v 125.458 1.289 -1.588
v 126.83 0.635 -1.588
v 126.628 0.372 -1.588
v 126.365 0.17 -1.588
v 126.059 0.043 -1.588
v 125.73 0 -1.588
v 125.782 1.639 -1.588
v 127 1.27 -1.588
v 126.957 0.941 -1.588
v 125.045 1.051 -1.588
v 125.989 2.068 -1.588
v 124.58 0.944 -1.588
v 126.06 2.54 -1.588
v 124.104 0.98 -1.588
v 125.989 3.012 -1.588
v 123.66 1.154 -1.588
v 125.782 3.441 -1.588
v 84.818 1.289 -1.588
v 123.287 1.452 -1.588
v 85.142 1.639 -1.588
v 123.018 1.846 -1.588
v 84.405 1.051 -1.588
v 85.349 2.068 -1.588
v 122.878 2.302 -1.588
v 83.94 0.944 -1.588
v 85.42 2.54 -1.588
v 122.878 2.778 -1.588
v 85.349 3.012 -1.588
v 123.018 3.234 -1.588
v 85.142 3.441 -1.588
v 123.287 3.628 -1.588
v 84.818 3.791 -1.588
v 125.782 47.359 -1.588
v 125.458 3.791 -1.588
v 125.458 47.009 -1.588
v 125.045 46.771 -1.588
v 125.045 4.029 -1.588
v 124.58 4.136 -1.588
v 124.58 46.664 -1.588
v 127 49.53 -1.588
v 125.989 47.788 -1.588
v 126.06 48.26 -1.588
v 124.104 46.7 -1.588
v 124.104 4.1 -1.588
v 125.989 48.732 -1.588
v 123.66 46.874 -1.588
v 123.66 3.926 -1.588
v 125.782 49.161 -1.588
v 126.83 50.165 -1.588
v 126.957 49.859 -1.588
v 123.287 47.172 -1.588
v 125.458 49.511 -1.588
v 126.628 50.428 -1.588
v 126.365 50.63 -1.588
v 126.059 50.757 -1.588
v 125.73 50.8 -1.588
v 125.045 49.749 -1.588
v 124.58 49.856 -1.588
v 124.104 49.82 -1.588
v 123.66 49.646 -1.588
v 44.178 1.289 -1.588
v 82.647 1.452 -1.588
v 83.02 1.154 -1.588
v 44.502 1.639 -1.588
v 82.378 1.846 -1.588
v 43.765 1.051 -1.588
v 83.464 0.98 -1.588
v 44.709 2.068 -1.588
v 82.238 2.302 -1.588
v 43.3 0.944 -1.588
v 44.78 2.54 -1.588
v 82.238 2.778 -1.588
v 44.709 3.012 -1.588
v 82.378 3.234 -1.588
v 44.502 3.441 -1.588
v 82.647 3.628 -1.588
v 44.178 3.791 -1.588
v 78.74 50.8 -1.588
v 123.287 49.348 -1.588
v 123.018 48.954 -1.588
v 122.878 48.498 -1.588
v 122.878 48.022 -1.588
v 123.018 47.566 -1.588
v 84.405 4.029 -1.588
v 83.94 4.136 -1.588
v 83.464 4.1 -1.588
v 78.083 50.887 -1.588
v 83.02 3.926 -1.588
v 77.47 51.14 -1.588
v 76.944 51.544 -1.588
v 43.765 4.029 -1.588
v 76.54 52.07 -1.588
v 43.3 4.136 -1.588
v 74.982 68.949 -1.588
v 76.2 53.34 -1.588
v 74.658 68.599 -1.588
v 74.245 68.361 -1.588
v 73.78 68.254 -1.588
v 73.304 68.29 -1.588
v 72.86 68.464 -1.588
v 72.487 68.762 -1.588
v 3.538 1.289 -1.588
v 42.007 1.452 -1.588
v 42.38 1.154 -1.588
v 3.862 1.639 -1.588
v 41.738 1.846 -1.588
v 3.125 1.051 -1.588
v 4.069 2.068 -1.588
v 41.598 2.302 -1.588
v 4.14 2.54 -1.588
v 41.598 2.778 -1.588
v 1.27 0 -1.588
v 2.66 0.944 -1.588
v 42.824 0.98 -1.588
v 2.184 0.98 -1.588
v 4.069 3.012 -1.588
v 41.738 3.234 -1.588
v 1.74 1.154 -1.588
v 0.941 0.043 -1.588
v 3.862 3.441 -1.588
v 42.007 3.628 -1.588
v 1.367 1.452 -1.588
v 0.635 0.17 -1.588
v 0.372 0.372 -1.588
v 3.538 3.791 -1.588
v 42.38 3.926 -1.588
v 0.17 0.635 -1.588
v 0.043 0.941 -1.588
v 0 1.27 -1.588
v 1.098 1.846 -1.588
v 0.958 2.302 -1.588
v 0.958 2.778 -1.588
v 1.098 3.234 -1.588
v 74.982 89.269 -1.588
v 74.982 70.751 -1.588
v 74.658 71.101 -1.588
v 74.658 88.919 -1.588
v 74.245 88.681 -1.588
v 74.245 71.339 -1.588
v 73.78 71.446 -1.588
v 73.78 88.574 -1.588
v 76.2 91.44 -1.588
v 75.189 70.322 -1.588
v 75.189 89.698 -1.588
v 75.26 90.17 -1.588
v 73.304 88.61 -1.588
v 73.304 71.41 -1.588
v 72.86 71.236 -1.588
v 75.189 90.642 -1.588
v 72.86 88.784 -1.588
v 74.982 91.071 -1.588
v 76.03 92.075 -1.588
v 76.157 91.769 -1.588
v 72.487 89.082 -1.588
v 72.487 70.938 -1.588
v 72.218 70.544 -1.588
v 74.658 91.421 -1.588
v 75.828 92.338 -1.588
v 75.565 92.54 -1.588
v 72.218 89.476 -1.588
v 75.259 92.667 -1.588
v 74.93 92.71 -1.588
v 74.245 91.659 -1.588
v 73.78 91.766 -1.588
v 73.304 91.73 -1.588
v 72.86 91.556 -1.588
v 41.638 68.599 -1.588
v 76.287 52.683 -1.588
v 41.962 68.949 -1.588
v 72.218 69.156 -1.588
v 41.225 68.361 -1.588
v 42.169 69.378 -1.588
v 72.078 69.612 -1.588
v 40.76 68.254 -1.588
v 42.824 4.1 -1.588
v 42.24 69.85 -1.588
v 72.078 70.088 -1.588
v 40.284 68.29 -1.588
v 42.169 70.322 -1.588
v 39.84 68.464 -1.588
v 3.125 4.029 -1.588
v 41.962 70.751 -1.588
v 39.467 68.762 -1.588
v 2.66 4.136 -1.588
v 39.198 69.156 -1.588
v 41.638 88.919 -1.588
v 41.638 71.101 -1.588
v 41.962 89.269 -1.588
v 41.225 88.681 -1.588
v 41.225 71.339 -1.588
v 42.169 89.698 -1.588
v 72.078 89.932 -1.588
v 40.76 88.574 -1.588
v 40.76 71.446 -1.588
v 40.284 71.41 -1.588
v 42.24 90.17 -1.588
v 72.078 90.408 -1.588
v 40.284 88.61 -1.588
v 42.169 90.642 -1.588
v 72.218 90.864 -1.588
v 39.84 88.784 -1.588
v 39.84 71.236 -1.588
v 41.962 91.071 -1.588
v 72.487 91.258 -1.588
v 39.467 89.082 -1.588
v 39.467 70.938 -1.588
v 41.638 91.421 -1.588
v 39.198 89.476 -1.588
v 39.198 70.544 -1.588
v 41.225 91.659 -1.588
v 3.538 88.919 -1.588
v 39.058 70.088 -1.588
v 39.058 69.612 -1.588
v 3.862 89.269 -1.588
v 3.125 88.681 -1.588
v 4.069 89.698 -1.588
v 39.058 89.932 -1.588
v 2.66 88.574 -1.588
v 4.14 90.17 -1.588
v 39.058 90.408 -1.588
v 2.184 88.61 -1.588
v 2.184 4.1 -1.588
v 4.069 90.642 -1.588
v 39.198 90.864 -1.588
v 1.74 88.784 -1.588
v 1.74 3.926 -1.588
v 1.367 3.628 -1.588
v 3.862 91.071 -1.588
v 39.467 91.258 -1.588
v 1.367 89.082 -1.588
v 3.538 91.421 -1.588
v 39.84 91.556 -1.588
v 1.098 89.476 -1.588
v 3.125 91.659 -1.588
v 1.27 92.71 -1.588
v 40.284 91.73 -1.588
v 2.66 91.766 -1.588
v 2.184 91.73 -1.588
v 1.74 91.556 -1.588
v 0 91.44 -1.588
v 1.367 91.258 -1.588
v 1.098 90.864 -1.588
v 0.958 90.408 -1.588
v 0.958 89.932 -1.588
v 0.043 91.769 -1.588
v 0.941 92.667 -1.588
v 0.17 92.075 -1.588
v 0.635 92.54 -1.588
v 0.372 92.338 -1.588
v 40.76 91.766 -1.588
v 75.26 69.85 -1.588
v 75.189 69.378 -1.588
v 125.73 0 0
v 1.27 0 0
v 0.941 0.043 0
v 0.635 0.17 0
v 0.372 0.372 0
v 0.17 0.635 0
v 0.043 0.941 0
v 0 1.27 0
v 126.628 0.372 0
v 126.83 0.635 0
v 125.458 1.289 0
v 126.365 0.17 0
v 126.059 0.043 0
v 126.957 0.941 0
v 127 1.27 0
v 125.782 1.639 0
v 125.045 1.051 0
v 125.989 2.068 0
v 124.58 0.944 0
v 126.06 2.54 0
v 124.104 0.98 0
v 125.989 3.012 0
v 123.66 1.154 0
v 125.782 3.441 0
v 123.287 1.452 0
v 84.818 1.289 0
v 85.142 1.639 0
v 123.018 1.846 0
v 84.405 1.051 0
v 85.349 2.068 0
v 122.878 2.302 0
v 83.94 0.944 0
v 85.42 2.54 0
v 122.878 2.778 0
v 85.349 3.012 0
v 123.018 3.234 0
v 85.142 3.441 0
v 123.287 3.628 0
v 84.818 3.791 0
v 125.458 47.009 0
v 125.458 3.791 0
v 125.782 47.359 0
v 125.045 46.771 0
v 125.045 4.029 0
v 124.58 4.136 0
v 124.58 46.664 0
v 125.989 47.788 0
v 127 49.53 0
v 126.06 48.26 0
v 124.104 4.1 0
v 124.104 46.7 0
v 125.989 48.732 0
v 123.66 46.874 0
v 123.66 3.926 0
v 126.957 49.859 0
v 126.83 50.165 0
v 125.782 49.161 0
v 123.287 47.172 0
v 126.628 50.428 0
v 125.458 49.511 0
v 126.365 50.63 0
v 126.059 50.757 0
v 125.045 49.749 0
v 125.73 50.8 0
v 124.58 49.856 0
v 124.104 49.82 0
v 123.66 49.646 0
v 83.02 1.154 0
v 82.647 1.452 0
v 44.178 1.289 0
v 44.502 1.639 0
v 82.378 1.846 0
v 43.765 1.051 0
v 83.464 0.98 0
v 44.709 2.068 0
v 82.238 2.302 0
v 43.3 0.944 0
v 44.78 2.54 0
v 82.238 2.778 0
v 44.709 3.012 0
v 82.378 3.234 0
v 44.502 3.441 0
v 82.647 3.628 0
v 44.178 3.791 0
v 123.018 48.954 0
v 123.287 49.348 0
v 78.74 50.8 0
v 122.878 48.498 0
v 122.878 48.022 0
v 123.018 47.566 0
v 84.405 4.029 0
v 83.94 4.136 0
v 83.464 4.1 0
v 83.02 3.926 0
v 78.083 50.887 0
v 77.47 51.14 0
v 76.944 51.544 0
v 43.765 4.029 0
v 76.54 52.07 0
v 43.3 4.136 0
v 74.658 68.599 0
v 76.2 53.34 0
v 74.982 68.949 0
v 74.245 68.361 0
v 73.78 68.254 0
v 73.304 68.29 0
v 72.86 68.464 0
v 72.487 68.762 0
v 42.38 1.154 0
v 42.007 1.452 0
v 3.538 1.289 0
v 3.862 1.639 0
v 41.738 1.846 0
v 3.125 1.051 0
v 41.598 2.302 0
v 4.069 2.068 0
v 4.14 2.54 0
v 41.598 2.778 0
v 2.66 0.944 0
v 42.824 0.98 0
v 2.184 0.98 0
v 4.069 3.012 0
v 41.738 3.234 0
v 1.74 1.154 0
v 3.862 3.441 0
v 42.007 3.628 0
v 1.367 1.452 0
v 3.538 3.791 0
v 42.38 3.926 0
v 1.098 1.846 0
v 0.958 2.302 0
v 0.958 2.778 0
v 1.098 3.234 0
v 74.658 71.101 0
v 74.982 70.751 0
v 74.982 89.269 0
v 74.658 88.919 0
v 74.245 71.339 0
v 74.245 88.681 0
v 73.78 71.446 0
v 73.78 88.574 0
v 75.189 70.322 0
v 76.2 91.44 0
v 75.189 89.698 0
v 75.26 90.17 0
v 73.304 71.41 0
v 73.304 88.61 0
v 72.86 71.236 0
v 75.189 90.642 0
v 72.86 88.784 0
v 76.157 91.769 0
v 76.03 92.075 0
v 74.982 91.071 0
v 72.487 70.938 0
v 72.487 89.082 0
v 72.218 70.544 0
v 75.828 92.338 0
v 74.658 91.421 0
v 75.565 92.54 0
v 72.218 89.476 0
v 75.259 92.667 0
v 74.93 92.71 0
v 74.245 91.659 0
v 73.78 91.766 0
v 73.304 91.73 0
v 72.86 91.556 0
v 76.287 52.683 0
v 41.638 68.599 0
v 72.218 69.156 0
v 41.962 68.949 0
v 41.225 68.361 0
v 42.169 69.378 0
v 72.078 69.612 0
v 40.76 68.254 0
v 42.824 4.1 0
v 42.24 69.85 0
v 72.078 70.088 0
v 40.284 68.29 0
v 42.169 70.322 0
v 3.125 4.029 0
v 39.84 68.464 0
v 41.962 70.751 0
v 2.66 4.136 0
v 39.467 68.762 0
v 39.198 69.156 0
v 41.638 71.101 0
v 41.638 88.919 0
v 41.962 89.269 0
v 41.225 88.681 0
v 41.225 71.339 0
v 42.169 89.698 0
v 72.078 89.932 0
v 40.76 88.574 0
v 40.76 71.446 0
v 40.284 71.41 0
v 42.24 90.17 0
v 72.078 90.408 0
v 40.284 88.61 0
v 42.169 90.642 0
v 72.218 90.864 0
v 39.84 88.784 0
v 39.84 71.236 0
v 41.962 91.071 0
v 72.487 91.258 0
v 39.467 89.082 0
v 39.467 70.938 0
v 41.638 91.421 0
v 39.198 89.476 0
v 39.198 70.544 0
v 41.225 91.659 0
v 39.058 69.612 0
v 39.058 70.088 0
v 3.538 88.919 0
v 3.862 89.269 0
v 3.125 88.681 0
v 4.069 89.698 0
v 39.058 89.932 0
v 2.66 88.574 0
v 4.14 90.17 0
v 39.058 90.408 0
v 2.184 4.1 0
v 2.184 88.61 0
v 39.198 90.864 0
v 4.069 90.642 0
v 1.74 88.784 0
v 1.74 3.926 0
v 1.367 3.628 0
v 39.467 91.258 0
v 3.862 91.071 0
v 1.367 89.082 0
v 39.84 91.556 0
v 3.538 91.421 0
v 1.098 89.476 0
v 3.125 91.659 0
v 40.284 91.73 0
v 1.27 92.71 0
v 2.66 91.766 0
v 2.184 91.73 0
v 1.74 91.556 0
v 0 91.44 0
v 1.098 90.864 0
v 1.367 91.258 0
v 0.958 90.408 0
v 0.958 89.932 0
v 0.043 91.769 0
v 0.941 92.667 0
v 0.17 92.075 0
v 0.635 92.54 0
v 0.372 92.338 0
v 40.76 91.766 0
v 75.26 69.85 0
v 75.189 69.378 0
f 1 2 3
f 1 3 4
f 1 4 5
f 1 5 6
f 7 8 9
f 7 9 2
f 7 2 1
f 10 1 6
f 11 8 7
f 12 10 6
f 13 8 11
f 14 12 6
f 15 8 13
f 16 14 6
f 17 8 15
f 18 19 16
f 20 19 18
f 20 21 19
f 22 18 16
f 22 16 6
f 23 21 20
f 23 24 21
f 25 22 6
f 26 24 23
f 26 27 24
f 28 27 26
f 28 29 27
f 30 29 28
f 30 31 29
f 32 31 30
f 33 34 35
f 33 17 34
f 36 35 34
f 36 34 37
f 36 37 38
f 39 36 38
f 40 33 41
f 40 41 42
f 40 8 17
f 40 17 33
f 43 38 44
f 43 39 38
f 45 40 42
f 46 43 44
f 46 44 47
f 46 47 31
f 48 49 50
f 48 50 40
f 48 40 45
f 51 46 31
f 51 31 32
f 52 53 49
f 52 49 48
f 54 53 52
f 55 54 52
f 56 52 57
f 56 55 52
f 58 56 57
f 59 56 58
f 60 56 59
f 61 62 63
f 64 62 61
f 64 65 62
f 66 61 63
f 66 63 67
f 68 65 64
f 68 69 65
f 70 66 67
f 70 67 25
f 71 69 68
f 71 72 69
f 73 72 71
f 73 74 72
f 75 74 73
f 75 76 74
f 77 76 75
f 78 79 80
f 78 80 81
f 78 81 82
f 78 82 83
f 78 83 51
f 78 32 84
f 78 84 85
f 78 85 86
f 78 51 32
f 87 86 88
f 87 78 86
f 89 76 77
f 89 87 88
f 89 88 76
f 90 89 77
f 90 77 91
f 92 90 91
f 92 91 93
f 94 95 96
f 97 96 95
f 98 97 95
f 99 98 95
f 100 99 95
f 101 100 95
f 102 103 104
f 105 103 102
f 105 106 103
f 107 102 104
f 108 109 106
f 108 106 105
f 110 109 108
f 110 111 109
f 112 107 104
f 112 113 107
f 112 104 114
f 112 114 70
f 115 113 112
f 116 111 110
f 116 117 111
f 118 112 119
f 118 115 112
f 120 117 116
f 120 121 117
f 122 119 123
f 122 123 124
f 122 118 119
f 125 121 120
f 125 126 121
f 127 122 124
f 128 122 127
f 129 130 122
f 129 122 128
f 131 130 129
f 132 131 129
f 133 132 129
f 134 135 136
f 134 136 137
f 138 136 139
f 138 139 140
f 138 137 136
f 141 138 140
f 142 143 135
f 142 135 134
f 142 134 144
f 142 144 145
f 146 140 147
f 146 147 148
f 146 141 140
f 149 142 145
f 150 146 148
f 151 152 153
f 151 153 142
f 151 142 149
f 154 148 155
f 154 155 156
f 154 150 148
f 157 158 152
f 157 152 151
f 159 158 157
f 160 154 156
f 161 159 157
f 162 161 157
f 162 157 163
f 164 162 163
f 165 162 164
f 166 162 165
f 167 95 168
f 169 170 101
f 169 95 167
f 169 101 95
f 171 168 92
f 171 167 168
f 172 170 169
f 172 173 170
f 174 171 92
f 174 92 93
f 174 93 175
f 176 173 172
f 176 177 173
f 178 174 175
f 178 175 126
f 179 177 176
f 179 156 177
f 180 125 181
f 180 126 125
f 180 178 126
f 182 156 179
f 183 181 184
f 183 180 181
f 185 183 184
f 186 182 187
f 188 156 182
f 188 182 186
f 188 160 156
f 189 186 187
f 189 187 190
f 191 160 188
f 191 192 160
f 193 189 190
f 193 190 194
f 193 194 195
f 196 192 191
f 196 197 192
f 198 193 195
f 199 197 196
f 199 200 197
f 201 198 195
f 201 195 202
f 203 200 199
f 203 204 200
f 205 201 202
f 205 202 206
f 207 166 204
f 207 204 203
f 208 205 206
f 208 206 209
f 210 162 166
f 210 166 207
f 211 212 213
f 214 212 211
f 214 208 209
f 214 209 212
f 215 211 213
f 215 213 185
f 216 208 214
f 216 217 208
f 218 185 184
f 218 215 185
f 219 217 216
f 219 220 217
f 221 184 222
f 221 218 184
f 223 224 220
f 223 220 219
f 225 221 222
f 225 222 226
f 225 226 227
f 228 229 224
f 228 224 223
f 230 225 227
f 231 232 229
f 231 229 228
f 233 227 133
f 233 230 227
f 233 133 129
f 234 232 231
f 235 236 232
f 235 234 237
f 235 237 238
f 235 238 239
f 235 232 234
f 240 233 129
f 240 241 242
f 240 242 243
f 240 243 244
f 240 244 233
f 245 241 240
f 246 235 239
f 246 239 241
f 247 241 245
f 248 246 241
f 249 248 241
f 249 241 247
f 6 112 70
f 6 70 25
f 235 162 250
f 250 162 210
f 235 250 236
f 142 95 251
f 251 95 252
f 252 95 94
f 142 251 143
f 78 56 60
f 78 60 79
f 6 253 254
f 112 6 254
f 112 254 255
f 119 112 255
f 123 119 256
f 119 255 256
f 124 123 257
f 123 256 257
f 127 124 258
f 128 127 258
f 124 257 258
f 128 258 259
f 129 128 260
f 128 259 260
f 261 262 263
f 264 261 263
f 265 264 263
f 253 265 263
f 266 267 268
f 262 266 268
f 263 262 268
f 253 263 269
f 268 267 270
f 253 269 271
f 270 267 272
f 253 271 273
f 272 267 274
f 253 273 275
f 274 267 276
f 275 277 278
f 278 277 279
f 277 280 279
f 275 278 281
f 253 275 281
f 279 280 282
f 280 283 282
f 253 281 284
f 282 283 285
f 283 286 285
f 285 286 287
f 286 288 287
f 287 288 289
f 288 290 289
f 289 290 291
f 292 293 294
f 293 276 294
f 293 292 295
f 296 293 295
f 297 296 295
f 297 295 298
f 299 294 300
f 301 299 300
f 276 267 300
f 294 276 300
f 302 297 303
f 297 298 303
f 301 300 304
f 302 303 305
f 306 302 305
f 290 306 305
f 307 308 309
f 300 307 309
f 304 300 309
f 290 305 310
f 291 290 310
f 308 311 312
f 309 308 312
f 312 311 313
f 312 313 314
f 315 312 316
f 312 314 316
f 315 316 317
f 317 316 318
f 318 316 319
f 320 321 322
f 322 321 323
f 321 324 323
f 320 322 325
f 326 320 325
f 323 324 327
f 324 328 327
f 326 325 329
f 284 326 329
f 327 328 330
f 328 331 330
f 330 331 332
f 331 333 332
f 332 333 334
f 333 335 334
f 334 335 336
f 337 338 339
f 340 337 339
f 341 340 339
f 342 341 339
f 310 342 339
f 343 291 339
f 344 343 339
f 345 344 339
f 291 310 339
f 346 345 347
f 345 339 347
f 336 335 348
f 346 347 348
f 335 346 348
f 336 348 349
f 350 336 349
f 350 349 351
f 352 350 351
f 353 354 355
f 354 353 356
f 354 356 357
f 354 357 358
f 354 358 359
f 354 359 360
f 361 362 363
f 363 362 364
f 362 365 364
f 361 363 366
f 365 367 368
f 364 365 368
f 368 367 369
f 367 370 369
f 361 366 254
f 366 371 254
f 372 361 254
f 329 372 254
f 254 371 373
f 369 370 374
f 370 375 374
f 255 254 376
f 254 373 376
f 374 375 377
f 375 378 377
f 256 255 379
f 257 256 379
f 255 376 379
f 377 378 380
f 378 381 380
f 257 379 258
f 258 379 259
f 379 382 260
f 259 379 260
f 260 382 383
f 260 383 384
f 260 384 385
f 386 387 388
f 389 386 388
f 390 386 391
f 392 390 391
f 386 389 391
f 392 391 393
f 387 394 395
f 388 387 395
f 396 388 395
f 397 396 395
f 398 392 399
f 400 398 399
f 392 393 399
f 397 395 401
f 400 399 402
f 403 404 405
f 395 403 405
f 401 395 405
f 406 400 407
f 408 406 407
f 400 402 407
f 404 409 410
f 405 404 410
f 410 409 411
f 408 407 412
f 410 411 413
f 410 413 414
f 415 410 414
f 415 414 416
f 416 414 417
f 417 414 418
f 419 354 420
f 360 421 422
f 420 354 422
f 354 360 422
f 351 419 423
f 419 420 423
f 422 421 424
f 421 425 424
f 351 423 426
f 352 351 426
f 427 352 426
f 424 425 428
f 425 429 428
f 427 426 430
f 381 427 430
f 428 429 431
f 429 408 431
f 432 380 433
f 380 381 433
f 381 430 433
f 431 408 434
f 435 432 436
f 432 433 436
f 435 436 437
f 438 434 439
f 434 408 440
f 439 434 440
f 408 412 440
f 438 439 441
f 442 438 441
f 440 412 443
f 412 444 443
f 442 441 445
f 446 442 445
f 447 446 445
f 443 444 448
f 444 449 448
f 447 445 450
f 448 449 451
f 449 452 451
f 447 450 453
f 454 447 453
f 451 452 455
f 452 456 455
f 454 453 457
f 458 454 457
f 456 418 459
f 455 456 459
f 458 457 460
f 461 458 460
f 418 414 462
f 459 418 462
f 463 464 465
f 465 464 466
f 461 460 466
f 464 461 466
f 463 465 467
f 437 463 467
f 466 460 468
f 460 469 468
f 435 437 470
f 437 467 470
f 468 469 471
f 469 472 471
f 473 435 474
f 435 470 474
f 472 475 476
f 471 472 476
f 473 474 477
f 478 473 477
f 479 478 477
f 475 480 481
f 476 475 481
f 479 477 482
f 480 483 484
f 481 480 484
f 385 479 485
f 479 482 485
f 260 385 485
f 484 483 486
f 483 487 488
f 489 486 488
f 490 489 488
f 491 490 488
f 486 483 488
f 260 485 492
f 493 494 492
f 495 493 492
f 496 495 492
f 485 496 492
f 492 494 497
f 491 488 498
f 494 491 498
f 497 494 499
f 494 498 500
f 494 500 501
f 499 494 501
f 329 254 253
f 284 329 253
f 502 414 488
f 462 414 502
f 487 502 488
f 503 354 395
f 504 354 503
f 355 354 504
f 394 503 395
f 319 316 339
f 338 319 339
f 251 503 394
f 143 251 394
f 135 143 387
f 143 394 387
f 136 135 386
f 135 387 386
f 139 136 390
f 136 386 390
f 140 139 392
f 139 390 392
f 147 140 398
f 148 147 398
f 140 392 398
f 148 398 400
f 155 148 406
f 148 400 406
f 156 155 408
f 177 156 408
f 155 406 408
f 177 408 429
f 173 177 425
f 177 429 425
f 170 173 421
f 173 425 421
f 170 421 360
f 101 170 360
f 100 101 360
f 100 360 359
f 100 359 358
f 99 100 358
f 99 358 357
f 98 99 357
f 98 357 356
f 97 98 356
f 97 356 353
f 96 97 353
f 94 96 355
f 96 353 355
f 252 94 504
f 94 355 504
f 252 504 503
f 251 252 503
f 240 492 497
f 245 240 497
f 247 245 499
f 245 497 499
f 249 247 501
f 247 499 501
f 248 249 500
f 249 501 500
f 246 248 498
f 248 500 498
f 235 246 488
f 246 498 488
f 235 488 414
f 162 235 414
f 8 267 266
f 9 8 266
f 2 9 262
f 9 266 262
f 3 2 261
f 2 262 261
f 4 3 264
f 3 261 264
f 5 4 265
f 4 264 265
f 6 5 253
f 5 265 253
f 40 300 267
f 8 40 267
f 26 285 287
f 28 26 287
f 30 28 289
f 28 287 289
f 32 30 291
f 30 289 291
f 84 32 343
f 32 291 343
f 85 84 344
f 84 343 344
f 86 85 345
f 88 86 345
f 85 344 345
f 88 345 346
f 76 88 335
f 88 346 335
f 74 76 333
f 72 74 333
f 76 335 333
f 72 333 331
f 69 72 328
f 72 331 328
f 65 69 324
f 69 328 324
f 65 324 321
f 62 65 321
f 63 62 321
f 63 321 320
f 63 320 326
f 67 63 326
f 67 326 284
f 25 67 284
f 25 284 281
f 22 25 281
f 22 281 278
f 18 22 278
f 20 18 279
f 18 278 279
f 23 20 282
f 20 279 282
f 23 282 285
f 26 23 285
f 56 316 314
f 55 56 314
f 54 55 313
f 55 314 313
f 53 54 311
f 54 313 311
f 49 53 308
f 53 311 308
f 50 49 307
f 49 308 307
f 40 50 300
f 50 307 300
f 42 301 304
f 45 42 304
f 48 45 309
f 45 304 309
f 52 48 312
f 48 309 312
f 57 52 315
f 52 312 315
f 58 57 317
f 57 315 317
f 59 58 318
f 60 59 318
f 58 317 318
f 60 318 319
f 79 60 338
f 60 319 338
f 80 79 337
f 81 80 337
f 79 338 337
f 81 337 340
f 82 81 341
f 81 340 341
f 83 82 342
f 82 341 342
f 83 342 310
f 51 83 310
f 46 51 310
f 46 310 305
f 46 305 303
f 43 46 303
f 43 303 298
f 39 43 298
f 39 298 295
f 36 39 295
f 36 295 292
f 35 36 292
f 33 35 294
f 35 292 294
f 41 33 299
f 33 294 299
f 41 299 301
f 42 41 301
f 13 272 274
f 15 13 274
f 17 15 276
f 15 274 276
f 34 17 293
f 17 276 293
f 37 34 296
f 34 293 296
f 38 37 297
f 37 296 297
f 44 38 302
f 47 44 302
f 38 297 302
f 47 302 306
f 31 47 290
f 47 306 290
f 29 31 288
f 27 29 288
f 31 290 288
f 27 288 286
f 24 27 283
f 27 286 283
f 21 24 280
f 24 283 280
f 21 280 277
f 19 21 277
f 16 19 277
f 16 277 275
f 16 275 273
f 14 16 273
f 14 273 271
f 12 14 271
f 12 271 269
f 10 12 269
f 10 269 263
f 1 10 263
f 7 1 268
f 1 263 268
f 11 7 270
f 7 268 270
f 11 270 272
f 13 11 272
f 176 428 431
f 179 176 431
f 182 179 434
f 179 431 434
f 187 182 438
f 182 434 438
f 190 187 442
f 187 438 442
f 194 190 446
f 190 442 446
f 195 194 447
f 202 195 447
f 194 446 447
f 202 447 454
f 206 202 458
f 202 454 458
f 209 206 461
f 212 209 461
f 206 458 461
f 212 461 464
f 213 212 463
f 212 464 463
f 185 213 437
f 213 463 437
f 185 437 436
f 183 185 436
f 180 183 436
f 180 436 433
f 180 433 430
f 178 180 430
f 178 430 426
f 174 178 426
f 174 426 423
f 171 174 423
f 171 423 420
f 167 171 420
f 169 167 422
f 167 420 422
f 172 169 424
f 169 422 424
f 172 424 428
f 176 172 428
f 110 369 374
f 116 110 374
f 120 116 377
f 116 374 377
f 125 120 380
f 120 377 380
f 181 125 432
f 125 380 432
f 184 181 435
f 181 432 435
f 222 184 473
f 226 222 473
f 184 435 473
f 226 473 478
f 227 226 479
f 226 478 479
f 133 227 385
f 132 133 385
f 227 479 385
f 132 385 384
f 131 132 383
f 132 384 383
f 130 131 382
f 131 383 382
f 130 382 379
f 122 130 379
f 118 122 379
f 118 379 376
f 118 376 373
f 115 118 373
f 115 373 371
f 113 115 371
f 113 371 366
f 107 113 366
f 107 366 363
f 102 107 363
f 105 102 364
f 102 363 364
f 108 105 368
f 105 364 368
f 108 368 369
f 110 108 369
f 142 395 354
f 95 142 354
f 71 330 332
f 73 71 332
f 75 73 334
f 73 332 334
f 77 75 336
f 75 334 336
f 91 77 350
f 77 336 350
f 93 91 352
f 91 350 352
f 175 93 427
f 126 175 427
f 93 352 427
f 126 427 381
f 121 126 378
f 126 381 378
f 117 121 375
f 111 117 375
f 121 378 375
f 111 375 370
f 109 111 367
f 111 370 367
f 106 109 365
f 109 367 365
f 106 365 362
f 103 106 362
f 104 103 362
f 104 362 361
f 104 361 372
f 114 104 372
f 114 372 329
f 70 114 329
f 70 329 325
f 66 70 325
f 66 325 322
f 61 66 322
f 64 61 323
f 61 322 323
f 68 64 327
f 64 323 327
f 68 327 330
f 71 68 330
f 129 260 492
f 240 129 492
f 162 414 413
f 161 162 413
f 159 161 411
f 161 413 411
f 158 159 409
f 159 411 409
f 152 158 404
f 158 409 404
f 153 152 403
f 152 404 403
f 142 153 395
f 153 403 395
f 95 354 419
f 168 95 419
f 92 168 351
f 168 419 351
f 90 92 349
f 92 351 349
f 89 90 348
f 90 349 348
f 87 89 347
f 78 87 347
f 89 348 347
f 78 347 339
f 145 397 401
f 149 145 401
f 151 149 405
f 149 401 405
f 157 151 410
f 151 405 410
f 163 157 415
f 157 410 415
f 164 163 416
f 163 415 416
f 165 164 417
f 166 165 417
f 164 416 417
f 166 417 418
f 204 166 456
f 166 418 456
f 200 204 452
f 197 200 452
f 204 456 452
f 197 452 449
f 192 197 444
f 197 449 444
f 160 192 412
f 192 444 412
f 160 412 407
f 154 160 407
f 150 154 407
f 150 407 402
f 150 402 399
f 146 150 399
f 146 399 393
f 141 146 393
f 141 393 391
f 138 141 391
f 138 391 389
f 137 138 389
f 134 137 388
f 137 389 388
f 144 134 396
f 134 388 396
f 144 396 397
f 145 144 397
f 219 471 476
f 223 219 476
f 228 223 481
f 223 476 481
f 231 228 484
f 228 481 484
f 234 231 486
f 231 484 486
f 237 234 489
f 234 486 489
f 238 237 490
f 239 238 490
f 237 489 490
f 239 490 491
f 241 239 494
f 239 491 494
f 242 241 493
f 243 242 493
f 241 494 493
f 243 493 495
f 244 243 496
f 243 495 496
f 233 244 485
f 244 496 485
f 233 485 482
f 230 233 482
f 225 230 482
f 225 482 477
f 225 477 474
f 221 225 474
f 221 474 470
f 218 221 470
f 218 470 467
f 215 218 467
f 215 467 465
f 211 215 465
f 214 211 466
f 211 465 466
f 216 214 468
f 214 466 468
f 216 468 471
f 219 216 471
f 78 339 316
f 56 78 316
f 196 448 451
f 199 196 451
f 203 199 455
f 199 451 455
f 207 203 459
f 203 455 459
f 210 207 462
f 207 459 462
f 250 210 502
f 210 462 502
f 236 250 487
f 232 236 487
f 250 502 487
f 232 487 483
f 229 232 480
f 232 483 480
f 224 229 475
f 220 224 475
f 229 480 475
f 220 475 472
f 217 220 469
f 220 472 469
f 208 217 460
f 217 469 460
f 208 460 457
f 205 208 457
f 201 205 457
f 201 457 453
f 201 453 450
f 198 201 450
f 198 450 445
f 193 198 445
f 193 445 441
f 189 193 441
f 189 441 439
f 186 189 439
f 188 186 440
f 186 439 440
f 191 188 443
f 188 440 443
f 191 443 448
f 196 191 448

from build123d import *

# Parameters (mm, degrees)
MODEL_R             = 1.6
BOSS_EXTRUDE1_DEPTH = 1.5875


with BuildPart() as part:
    # Model → Boss-Extrude1 (new body)
    with BuildSketch(Plane.XY):
        with BuildLine():
            Line((127, 49.53), (127, 1.27))
            ThreePointArc((127, 1.27), (126.628025612, 0.371974388), (125.73, 0))
            Line((125.73, 0), (1.27, 0))
            ThreePointArc((1.27, 0), (0.371974388, 0.371974388), (0, 1.27))
            Line((0, 1.27), (0, 91.44))
            ThreePointArc((0, 91.44), (0.371974388, 92.338025612), (1.27, 92.71))
            Line((1.27, 92.71), (74.93, 92.71))
            ThreePointArc((74.93, 92.71), (75.828025612, 92.338025612), (76.2, 91.44))
            Line((76.2, 91.44), (76.2, 53.34))
            ThreePointArc((76.2, 53.34), (76.943948776, 51.543948776), (78.74, 50.8))
            Line((78.74, 50.8), (125.73, 50.8))
            ThreePointArc((125.73, 50.8), (126.628025612, 50.428025612), (127, 49.53))
        make_face()
        with Locations((2.54, 2.54)):
            Circle(MODEL_R, mode=Mode.SUBTRACT)
        with Locations((124.46, 2.54)):
            Circle(MODEL_R, mode=Mode.SUBTRACT)
        with Locations((2.54, 90.17)):
            Circle(MODEL_R, mode=Mode.SUBTRACT)
        with Locations((43.18, 2.54)):
            Circle(MODEL_R, mode=Mode.SUBTRACT)
        with Locations((83.82, 2.54)):
            Circle(MODEL_R, mode=Mode.SUBTRACT)
        with Locations((124.46, 48.26)):
            Circle(MODEL_R, mode=Mode.SUBTRACT)
        with Locations((73.66, 69.85)):
            Circle(MODEL_R, mode=Mode.SUBTRACT)
        with Locations((40.64, 69.85)):
            Circle(MODEL_R, mode=Mode.SUBTRACT)
        with Locations((40.64, 90.17)):
            Circle(MODEL_R, mode=Mode.SUBTRACT)
        with Locations((73.66, 90.17)):
            Circle(MODEL_R, mode=Mode.SUBTRACT)
    extrude(amount=-BOSS_EXTRUDE1_DEPTH)


solid = part.part
